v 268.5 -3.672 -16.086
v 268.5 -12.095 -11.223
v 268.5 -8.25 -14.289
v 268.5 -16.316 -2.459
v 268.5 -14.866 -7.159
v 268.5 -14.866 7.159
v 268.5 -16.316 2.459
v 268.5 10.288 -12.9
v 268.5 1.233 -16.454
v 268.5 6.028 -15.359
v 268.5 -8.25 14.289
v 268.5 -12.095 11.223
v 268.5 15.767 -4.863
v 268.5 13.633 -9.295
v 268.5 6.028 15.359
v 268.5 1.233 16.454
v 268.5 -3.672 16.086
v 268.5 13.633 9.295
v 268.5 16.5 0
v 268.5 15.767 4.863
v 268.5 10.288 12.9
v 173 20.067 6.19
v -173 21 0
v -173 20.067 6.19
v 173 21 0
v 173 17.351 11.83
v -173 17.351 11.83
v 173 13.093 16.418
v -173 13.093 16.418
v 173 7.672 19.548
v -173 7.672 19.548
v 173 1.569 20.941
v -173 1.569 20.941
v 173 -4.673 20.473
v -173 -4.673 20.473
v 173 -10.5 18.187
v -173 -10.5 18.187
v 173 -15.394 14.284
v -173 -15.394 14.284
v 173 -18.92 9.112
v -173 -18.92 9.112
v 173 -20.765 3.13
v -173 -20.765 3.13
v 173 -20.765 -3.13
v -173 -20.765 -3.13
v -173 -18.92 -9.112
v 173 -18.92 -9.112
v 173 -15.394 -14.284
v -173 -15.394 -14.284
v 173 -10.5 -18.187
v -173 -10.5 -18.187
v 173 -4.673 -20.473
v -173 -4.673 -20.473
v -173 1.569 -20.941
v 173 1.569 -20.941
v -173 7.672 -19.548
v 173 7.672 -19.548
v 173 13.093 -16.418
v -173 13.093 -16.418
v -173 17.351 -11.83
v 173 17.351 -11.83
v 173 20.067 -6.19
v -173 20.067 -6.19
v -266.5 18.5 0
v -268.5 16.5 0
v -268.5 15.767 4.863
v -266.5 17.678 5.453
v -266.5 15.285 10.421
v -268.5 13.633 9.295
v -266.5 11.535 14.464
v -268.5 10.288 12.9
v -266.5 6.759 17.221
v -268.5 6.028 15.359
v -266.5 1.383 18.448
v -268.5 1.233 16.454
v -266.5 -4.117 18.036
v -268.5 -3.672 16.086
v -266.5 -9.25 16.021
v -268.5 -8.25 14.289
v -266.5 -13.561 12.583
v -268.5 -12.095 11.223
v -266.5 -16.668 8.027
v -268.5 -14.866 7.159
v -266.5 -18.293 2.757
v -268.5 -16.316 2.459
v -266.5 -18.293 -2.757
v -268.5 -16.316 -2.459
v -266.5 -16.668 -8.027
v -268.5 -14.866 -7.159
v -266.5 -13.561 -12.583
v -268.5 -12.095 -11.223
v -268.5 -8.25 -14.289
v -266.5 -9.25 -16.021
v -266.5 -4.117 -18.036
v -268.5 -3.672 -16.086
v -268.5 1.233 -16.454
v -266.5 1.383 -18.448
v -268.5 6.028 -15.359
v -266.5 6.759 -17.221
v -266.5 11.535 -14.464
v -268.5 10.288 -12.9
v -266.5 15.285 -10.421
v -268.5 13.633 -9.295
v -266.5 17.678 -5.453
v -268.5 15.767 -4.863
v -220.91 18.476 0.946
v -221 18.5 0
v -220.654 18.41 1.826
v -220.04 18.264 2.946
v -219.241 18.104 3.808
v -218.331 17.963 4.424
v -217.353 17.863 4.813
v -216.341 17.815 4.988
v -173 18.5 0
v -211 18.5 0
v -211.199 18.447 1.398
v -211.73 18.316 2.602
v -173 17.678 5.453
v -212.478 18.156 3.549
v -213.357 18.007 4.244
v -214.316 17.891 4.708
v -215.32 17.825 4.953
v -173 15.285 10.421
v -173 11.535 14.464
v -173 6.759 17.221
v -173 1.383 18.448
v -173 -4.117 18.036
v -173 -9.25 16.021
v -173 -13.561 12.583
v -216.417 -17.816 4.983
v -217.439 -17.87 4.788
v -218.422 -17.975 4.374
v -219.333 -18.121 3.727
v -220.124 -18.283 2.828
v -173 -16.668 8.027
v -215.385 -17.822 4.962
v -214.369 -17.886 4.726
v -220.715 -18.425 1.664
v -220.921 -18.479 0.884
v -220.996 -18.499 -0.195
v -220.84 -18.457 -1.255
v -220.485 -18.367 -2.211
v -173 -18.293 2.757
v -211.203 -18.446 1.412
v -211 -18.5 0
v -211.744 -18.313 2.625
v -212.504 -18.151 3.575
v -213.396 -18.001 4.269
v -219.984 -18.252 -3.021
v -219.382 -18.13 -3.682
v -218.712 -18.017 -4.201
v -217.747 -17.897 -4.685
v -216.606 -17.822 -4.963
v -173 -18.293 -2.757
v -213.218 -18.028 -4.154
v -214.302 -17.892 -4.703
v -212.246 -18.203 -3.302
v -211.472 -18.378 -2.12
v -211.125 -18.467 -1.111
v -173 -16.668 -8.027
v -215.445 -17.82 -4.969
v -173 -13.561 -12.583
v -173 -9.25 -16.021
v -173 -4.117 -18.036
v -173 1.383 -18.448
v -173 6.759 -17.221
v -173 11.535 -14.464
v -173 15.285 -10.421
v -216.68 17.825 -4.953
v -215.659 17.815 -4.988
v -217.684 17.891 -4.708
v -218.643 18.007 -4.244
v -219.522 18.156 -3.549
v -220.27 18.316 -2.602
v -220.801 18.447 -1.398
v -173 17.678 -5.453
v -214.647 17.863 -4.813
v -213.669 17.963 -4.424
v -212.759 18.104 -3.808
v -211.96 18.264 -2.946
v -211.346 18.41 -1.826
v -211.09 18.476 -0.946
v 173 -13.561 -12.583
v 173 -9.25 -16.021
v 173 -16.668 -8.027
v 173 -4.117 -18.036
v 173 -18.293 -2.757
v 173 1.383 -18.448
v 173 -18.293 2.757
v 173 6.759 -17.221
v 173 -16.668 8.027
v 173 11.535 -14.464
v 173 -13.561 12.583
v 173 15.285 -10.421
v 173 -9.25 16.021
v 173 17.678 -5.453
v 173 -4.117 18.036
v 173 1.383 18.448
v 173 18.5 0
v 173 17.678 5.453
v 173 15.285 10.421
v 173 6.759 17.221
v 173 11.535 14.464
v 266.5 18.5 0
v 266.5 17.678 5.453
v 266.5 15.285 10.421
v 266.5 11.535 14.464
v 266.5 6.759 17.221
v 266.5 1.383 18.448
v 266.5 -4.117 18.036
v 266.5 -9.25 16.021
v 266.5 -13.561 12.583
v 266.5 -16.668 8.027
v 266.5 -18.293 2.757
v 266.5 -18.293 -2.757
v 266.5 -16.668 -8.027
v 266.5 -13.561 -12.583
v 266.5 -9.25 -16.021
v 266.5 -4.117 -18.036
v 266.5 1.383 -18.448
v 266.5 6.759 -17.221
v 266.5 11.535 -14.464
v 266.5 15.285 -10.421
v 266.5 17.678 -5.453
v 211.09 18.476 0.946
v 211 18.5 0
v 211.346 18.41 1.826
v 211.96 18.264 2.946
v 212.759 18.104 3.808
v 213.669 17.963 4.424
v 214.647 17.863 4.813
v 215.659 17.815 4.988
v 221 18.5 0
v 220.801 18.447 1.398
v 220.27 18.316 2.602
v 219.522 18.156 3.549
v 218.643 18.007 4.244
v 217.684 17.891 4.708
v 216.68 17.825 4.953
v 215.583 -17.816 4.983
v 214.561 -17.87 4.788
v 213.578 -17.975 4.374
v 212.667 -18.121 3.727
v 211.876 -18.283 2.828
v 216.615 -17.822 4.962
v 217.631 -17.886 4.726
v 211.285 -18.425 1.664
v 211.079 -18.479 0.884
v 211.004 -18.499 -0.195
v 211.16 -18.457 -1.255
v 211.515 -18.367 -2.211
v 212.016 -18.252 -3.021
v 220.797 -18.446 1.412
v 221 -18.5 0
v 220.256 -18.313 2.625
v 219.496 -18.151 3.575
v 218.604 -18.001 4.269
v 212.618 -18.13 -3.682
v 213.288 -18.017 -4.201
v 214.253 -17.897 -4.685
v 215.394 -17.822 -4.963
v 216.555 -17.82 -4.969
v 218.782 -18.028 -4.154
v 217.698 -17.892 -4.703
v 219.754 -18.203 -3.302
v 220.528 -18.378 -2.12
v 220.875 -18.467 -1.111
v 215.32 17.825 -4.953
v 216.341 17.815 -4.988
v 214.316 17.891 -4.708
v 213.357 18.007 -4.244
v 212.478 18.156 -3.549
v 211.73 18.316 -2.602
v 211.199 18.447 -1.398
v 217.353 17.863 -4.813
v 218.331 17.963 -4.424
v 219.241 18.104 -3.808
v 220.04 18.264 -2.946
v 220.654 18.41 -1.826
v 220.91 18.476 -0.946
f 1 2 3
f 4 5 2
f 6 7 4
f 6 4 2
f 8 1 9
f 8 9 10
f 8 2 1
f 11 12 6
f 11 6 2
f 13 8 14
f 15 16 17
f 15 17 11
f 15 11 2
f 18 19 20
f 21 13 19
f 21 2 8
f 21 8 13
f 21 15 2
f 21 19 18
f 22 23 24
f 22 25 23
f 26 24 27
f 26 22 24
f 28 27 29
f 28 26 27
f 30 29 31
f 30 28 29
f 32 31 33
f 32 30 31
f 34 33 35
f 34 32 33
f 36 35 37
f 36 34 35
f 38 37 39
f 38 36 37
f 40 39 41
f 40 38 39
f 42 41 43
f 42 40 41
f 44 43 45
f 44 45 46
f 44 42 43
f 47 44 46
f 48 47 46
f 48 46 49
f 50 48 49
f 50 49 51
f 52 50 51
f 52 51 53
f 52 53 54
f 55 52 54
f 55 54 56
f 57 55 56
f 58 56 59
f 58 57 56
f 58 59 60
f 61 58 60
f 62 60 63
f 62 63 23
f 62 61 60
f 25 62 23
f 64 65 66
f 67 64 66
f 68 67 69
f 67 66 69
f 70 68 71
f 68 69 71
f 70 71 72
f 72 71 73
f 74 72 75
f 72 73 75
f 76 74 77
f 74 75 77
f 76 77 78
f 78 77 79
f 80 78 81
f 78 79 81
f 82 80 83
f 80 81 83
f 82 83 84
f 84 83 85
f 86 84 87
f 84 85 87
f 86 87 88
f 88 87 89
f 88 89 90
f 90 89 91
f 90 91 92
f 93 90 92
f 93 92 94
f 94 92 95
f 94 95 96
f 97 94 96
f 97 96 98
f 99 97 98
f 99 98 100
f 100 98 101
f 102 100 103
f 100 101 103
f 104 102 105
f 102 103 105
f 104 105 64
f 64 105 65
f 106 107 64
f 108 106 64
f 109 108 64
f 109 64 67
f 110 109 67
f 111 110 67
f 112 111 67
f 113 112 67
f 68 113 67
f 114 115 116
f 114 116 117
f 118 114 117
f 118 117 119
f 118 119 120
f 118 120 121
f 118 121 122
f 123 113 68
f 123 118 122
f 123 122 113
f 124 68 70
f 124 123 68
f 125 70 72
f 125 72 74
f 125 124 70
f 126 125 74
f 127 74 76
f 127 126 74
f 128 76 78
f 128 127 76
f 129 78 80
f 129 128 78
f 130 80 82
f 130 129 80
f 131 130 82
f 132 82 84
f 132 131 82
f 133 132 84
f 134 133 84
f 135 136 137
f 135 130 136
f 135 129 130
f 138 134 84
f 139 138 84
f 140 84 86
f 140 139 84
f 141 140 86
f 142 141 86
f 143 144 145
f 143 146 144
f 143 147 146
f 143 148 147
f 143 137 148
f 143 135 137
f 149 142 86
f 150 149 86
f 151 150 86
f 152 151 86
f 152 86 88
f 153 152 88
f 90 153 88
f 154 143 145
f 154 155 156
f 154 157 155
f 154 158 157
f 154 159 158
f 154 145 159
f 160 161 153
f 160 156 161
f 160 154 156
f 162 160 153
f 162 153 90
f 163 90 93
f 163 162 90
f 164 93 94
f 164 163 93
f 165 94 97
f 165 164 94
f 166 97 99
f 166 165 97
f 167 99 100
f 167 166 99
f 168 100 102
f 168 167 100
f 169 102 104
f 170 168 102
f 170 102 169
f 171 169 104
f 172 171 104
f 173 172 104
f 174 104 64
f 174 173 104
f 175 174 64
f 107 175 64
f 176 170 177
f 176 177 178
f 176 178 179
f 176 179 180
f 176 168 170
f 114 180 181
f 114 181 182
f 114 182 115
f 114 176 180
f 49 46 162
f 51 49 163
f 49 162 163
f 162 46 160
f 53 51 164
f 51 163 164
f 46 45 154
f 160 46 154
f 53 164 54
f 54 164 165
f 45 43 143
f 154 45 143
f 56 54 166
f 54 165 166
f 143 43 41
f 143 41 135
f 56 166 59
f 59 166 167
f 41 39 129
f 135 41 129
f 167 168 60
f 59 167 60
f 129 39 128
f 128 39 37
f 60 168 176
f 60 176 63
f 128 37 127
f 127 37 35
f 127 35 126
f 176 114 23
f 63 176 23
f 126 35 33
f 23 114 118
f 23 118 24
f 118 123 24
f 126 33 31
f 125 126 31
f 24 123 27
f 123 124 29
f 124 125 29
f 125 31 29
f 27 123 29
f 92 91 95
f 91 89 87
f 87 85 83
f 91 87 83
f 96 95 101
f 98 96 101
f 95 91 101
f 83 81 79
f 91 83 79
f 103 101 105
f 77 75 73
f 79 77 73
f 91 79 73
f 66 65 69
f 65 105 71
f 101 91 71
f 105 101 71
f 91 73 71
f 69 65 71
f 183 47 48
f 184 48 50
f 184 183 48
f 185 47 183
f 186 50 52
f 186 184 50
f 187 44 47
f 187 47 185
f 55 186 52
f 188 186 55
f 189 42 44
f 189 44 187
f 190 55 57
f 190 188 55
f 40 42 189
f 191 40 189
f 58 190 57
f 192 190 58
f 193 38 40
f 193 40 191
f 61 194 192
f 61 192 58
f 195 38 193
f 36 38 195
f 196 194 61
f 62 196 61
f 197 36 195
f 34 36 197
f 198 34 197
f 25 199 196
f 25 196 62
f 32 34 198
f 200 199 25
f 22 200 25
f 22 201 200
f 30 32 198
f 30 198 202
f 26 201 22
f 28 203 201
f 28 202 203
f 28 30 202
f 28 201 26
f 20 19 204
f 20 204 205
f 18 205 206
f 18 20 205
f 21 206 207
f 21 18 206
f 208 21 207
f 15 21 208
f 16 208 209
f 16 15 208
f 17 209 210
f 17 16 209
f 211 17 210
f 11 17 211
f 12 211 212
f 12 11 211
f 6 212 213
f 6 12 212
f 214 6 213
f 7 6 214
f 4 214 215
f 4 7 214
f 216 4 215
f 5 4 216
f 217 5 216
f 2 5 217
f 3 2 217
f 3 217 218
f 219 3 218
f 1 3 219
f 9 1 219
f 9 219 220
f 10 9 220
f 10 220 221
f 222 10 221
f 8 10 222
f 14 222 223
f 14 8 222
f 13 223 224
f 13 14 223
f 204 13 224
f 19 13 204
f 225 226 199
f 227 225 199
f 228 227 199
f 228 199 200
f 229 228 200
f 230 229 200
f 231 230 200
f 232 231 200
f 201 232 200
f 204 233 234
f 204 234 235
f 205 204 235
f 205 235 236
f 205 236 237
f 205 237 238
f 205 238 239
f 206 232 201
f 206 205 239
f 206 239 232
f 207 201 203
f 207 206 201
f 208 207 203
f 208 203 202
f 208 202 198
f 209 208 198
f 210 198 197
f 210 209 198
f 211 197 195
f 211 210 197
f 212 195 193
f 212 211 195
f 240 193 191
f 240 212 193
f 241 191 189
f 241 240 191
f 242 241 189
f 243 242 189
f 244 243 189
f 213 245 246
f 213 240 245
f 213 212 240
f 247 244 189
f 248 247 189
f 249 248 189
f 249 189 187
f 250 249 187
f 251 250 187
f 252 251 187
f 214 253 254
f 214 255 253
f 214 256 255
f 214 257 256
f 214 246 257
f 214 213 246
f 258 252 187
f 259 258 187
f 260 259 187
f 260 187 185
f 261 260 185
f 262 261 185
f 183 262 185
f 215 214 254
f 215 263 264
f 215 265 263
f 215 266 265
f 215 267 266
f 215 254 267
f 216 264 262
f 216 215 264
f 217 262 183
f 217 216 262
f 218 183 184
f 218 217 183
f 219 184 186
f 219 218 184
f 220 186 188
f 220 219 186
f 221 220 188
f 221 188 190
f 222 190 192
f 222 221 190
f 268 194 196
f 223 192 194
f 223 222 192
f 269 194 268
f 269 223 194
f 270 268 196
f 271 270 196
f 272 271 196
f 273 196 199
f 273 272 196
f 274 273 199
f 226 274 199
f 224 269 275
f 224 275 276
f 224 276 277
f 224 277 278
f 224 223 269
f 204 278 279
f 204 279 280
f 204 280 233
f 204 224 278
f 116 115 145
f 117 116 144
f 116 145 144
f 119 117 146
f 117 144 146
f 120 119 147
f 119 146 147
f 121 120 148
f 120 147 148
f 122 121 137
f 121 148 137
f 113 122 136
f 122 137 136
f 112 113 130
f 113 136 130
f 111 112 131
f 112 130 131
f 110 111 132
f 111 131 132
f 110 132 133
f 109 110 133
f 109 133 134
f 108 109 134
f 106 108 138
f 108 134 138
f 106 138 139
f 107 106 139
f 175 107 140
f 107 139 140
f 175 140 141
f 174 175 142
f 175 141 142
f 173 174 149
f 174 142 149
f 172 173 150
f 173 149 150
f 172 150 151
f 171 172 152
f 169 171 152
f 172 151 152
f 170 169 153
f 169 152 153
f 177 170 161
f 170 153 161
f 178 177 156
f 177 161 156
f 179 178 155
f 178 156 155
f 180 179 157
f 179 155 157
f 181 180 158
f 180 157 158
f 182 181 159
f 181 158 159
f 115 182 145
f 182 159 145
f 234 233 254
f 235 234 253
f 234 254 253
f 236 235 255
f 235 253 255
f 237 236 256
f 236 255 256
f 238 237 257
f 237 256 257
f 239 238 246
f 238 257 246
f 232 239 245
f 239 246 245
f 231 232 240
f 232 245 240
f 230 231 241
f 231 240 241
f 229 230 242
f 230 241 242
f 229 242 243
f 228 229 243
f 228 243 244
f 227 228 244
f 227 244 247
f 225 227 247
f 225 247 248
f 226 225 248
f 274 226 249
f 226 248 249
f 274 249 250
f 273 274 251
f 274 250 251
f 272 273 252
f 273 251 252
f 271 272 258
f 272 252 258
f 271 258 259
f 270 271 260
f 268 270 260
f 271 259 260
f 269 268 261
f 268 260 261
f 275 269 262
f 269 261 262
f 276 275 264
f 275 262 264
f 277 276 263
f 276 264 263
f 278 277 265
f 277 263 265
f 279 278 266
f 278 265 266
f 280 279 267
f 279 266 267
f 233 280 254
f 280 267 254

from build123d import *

# Parameters (mm, degrees)
F0_R     = 18.5
F1_DEPTH = 268.5
F2_R     = 5
F3_DEPTH = 25
F4_SIZE  = 2
F5_R     = 21
F6_DEPTH = 173


with BuildPart() as f1:
    # F0 (on Right) → F1 (new body, symmetric)
    with BuildSketch(Plane.YZ):
        Circle(F0_R)
    extrude(amount=F1_DEPTH, both=True)

    # F2 (on Front) → F3 (cut, symmetric)
    with BuildSketch(Plane.XZ):
        with Locations((-216, 0)):
            Circle(F2_R)
        with Locations((216, 0)):
            Circle(F2_R)
    extrude(amount=F3_DEPTH, both=True, mode=Mode.SUBTRACT)

    # F4
    f4_edges = [f1.edges().sort_by_distance(p)[0] for p in [
        (-268.5, -18.5, 0),
        (268.5, -18.5, 0),
    ]]
    chamfer(f4_edges, length=F4_SIZE)

    # F5 (on Right) → F6 (join, symmetric)
    with BuildSketch(Plane.YZ):
        Circle(F5_R)
    extrude(amount=F6_DEPTH, both=True)


solid = f1.part
